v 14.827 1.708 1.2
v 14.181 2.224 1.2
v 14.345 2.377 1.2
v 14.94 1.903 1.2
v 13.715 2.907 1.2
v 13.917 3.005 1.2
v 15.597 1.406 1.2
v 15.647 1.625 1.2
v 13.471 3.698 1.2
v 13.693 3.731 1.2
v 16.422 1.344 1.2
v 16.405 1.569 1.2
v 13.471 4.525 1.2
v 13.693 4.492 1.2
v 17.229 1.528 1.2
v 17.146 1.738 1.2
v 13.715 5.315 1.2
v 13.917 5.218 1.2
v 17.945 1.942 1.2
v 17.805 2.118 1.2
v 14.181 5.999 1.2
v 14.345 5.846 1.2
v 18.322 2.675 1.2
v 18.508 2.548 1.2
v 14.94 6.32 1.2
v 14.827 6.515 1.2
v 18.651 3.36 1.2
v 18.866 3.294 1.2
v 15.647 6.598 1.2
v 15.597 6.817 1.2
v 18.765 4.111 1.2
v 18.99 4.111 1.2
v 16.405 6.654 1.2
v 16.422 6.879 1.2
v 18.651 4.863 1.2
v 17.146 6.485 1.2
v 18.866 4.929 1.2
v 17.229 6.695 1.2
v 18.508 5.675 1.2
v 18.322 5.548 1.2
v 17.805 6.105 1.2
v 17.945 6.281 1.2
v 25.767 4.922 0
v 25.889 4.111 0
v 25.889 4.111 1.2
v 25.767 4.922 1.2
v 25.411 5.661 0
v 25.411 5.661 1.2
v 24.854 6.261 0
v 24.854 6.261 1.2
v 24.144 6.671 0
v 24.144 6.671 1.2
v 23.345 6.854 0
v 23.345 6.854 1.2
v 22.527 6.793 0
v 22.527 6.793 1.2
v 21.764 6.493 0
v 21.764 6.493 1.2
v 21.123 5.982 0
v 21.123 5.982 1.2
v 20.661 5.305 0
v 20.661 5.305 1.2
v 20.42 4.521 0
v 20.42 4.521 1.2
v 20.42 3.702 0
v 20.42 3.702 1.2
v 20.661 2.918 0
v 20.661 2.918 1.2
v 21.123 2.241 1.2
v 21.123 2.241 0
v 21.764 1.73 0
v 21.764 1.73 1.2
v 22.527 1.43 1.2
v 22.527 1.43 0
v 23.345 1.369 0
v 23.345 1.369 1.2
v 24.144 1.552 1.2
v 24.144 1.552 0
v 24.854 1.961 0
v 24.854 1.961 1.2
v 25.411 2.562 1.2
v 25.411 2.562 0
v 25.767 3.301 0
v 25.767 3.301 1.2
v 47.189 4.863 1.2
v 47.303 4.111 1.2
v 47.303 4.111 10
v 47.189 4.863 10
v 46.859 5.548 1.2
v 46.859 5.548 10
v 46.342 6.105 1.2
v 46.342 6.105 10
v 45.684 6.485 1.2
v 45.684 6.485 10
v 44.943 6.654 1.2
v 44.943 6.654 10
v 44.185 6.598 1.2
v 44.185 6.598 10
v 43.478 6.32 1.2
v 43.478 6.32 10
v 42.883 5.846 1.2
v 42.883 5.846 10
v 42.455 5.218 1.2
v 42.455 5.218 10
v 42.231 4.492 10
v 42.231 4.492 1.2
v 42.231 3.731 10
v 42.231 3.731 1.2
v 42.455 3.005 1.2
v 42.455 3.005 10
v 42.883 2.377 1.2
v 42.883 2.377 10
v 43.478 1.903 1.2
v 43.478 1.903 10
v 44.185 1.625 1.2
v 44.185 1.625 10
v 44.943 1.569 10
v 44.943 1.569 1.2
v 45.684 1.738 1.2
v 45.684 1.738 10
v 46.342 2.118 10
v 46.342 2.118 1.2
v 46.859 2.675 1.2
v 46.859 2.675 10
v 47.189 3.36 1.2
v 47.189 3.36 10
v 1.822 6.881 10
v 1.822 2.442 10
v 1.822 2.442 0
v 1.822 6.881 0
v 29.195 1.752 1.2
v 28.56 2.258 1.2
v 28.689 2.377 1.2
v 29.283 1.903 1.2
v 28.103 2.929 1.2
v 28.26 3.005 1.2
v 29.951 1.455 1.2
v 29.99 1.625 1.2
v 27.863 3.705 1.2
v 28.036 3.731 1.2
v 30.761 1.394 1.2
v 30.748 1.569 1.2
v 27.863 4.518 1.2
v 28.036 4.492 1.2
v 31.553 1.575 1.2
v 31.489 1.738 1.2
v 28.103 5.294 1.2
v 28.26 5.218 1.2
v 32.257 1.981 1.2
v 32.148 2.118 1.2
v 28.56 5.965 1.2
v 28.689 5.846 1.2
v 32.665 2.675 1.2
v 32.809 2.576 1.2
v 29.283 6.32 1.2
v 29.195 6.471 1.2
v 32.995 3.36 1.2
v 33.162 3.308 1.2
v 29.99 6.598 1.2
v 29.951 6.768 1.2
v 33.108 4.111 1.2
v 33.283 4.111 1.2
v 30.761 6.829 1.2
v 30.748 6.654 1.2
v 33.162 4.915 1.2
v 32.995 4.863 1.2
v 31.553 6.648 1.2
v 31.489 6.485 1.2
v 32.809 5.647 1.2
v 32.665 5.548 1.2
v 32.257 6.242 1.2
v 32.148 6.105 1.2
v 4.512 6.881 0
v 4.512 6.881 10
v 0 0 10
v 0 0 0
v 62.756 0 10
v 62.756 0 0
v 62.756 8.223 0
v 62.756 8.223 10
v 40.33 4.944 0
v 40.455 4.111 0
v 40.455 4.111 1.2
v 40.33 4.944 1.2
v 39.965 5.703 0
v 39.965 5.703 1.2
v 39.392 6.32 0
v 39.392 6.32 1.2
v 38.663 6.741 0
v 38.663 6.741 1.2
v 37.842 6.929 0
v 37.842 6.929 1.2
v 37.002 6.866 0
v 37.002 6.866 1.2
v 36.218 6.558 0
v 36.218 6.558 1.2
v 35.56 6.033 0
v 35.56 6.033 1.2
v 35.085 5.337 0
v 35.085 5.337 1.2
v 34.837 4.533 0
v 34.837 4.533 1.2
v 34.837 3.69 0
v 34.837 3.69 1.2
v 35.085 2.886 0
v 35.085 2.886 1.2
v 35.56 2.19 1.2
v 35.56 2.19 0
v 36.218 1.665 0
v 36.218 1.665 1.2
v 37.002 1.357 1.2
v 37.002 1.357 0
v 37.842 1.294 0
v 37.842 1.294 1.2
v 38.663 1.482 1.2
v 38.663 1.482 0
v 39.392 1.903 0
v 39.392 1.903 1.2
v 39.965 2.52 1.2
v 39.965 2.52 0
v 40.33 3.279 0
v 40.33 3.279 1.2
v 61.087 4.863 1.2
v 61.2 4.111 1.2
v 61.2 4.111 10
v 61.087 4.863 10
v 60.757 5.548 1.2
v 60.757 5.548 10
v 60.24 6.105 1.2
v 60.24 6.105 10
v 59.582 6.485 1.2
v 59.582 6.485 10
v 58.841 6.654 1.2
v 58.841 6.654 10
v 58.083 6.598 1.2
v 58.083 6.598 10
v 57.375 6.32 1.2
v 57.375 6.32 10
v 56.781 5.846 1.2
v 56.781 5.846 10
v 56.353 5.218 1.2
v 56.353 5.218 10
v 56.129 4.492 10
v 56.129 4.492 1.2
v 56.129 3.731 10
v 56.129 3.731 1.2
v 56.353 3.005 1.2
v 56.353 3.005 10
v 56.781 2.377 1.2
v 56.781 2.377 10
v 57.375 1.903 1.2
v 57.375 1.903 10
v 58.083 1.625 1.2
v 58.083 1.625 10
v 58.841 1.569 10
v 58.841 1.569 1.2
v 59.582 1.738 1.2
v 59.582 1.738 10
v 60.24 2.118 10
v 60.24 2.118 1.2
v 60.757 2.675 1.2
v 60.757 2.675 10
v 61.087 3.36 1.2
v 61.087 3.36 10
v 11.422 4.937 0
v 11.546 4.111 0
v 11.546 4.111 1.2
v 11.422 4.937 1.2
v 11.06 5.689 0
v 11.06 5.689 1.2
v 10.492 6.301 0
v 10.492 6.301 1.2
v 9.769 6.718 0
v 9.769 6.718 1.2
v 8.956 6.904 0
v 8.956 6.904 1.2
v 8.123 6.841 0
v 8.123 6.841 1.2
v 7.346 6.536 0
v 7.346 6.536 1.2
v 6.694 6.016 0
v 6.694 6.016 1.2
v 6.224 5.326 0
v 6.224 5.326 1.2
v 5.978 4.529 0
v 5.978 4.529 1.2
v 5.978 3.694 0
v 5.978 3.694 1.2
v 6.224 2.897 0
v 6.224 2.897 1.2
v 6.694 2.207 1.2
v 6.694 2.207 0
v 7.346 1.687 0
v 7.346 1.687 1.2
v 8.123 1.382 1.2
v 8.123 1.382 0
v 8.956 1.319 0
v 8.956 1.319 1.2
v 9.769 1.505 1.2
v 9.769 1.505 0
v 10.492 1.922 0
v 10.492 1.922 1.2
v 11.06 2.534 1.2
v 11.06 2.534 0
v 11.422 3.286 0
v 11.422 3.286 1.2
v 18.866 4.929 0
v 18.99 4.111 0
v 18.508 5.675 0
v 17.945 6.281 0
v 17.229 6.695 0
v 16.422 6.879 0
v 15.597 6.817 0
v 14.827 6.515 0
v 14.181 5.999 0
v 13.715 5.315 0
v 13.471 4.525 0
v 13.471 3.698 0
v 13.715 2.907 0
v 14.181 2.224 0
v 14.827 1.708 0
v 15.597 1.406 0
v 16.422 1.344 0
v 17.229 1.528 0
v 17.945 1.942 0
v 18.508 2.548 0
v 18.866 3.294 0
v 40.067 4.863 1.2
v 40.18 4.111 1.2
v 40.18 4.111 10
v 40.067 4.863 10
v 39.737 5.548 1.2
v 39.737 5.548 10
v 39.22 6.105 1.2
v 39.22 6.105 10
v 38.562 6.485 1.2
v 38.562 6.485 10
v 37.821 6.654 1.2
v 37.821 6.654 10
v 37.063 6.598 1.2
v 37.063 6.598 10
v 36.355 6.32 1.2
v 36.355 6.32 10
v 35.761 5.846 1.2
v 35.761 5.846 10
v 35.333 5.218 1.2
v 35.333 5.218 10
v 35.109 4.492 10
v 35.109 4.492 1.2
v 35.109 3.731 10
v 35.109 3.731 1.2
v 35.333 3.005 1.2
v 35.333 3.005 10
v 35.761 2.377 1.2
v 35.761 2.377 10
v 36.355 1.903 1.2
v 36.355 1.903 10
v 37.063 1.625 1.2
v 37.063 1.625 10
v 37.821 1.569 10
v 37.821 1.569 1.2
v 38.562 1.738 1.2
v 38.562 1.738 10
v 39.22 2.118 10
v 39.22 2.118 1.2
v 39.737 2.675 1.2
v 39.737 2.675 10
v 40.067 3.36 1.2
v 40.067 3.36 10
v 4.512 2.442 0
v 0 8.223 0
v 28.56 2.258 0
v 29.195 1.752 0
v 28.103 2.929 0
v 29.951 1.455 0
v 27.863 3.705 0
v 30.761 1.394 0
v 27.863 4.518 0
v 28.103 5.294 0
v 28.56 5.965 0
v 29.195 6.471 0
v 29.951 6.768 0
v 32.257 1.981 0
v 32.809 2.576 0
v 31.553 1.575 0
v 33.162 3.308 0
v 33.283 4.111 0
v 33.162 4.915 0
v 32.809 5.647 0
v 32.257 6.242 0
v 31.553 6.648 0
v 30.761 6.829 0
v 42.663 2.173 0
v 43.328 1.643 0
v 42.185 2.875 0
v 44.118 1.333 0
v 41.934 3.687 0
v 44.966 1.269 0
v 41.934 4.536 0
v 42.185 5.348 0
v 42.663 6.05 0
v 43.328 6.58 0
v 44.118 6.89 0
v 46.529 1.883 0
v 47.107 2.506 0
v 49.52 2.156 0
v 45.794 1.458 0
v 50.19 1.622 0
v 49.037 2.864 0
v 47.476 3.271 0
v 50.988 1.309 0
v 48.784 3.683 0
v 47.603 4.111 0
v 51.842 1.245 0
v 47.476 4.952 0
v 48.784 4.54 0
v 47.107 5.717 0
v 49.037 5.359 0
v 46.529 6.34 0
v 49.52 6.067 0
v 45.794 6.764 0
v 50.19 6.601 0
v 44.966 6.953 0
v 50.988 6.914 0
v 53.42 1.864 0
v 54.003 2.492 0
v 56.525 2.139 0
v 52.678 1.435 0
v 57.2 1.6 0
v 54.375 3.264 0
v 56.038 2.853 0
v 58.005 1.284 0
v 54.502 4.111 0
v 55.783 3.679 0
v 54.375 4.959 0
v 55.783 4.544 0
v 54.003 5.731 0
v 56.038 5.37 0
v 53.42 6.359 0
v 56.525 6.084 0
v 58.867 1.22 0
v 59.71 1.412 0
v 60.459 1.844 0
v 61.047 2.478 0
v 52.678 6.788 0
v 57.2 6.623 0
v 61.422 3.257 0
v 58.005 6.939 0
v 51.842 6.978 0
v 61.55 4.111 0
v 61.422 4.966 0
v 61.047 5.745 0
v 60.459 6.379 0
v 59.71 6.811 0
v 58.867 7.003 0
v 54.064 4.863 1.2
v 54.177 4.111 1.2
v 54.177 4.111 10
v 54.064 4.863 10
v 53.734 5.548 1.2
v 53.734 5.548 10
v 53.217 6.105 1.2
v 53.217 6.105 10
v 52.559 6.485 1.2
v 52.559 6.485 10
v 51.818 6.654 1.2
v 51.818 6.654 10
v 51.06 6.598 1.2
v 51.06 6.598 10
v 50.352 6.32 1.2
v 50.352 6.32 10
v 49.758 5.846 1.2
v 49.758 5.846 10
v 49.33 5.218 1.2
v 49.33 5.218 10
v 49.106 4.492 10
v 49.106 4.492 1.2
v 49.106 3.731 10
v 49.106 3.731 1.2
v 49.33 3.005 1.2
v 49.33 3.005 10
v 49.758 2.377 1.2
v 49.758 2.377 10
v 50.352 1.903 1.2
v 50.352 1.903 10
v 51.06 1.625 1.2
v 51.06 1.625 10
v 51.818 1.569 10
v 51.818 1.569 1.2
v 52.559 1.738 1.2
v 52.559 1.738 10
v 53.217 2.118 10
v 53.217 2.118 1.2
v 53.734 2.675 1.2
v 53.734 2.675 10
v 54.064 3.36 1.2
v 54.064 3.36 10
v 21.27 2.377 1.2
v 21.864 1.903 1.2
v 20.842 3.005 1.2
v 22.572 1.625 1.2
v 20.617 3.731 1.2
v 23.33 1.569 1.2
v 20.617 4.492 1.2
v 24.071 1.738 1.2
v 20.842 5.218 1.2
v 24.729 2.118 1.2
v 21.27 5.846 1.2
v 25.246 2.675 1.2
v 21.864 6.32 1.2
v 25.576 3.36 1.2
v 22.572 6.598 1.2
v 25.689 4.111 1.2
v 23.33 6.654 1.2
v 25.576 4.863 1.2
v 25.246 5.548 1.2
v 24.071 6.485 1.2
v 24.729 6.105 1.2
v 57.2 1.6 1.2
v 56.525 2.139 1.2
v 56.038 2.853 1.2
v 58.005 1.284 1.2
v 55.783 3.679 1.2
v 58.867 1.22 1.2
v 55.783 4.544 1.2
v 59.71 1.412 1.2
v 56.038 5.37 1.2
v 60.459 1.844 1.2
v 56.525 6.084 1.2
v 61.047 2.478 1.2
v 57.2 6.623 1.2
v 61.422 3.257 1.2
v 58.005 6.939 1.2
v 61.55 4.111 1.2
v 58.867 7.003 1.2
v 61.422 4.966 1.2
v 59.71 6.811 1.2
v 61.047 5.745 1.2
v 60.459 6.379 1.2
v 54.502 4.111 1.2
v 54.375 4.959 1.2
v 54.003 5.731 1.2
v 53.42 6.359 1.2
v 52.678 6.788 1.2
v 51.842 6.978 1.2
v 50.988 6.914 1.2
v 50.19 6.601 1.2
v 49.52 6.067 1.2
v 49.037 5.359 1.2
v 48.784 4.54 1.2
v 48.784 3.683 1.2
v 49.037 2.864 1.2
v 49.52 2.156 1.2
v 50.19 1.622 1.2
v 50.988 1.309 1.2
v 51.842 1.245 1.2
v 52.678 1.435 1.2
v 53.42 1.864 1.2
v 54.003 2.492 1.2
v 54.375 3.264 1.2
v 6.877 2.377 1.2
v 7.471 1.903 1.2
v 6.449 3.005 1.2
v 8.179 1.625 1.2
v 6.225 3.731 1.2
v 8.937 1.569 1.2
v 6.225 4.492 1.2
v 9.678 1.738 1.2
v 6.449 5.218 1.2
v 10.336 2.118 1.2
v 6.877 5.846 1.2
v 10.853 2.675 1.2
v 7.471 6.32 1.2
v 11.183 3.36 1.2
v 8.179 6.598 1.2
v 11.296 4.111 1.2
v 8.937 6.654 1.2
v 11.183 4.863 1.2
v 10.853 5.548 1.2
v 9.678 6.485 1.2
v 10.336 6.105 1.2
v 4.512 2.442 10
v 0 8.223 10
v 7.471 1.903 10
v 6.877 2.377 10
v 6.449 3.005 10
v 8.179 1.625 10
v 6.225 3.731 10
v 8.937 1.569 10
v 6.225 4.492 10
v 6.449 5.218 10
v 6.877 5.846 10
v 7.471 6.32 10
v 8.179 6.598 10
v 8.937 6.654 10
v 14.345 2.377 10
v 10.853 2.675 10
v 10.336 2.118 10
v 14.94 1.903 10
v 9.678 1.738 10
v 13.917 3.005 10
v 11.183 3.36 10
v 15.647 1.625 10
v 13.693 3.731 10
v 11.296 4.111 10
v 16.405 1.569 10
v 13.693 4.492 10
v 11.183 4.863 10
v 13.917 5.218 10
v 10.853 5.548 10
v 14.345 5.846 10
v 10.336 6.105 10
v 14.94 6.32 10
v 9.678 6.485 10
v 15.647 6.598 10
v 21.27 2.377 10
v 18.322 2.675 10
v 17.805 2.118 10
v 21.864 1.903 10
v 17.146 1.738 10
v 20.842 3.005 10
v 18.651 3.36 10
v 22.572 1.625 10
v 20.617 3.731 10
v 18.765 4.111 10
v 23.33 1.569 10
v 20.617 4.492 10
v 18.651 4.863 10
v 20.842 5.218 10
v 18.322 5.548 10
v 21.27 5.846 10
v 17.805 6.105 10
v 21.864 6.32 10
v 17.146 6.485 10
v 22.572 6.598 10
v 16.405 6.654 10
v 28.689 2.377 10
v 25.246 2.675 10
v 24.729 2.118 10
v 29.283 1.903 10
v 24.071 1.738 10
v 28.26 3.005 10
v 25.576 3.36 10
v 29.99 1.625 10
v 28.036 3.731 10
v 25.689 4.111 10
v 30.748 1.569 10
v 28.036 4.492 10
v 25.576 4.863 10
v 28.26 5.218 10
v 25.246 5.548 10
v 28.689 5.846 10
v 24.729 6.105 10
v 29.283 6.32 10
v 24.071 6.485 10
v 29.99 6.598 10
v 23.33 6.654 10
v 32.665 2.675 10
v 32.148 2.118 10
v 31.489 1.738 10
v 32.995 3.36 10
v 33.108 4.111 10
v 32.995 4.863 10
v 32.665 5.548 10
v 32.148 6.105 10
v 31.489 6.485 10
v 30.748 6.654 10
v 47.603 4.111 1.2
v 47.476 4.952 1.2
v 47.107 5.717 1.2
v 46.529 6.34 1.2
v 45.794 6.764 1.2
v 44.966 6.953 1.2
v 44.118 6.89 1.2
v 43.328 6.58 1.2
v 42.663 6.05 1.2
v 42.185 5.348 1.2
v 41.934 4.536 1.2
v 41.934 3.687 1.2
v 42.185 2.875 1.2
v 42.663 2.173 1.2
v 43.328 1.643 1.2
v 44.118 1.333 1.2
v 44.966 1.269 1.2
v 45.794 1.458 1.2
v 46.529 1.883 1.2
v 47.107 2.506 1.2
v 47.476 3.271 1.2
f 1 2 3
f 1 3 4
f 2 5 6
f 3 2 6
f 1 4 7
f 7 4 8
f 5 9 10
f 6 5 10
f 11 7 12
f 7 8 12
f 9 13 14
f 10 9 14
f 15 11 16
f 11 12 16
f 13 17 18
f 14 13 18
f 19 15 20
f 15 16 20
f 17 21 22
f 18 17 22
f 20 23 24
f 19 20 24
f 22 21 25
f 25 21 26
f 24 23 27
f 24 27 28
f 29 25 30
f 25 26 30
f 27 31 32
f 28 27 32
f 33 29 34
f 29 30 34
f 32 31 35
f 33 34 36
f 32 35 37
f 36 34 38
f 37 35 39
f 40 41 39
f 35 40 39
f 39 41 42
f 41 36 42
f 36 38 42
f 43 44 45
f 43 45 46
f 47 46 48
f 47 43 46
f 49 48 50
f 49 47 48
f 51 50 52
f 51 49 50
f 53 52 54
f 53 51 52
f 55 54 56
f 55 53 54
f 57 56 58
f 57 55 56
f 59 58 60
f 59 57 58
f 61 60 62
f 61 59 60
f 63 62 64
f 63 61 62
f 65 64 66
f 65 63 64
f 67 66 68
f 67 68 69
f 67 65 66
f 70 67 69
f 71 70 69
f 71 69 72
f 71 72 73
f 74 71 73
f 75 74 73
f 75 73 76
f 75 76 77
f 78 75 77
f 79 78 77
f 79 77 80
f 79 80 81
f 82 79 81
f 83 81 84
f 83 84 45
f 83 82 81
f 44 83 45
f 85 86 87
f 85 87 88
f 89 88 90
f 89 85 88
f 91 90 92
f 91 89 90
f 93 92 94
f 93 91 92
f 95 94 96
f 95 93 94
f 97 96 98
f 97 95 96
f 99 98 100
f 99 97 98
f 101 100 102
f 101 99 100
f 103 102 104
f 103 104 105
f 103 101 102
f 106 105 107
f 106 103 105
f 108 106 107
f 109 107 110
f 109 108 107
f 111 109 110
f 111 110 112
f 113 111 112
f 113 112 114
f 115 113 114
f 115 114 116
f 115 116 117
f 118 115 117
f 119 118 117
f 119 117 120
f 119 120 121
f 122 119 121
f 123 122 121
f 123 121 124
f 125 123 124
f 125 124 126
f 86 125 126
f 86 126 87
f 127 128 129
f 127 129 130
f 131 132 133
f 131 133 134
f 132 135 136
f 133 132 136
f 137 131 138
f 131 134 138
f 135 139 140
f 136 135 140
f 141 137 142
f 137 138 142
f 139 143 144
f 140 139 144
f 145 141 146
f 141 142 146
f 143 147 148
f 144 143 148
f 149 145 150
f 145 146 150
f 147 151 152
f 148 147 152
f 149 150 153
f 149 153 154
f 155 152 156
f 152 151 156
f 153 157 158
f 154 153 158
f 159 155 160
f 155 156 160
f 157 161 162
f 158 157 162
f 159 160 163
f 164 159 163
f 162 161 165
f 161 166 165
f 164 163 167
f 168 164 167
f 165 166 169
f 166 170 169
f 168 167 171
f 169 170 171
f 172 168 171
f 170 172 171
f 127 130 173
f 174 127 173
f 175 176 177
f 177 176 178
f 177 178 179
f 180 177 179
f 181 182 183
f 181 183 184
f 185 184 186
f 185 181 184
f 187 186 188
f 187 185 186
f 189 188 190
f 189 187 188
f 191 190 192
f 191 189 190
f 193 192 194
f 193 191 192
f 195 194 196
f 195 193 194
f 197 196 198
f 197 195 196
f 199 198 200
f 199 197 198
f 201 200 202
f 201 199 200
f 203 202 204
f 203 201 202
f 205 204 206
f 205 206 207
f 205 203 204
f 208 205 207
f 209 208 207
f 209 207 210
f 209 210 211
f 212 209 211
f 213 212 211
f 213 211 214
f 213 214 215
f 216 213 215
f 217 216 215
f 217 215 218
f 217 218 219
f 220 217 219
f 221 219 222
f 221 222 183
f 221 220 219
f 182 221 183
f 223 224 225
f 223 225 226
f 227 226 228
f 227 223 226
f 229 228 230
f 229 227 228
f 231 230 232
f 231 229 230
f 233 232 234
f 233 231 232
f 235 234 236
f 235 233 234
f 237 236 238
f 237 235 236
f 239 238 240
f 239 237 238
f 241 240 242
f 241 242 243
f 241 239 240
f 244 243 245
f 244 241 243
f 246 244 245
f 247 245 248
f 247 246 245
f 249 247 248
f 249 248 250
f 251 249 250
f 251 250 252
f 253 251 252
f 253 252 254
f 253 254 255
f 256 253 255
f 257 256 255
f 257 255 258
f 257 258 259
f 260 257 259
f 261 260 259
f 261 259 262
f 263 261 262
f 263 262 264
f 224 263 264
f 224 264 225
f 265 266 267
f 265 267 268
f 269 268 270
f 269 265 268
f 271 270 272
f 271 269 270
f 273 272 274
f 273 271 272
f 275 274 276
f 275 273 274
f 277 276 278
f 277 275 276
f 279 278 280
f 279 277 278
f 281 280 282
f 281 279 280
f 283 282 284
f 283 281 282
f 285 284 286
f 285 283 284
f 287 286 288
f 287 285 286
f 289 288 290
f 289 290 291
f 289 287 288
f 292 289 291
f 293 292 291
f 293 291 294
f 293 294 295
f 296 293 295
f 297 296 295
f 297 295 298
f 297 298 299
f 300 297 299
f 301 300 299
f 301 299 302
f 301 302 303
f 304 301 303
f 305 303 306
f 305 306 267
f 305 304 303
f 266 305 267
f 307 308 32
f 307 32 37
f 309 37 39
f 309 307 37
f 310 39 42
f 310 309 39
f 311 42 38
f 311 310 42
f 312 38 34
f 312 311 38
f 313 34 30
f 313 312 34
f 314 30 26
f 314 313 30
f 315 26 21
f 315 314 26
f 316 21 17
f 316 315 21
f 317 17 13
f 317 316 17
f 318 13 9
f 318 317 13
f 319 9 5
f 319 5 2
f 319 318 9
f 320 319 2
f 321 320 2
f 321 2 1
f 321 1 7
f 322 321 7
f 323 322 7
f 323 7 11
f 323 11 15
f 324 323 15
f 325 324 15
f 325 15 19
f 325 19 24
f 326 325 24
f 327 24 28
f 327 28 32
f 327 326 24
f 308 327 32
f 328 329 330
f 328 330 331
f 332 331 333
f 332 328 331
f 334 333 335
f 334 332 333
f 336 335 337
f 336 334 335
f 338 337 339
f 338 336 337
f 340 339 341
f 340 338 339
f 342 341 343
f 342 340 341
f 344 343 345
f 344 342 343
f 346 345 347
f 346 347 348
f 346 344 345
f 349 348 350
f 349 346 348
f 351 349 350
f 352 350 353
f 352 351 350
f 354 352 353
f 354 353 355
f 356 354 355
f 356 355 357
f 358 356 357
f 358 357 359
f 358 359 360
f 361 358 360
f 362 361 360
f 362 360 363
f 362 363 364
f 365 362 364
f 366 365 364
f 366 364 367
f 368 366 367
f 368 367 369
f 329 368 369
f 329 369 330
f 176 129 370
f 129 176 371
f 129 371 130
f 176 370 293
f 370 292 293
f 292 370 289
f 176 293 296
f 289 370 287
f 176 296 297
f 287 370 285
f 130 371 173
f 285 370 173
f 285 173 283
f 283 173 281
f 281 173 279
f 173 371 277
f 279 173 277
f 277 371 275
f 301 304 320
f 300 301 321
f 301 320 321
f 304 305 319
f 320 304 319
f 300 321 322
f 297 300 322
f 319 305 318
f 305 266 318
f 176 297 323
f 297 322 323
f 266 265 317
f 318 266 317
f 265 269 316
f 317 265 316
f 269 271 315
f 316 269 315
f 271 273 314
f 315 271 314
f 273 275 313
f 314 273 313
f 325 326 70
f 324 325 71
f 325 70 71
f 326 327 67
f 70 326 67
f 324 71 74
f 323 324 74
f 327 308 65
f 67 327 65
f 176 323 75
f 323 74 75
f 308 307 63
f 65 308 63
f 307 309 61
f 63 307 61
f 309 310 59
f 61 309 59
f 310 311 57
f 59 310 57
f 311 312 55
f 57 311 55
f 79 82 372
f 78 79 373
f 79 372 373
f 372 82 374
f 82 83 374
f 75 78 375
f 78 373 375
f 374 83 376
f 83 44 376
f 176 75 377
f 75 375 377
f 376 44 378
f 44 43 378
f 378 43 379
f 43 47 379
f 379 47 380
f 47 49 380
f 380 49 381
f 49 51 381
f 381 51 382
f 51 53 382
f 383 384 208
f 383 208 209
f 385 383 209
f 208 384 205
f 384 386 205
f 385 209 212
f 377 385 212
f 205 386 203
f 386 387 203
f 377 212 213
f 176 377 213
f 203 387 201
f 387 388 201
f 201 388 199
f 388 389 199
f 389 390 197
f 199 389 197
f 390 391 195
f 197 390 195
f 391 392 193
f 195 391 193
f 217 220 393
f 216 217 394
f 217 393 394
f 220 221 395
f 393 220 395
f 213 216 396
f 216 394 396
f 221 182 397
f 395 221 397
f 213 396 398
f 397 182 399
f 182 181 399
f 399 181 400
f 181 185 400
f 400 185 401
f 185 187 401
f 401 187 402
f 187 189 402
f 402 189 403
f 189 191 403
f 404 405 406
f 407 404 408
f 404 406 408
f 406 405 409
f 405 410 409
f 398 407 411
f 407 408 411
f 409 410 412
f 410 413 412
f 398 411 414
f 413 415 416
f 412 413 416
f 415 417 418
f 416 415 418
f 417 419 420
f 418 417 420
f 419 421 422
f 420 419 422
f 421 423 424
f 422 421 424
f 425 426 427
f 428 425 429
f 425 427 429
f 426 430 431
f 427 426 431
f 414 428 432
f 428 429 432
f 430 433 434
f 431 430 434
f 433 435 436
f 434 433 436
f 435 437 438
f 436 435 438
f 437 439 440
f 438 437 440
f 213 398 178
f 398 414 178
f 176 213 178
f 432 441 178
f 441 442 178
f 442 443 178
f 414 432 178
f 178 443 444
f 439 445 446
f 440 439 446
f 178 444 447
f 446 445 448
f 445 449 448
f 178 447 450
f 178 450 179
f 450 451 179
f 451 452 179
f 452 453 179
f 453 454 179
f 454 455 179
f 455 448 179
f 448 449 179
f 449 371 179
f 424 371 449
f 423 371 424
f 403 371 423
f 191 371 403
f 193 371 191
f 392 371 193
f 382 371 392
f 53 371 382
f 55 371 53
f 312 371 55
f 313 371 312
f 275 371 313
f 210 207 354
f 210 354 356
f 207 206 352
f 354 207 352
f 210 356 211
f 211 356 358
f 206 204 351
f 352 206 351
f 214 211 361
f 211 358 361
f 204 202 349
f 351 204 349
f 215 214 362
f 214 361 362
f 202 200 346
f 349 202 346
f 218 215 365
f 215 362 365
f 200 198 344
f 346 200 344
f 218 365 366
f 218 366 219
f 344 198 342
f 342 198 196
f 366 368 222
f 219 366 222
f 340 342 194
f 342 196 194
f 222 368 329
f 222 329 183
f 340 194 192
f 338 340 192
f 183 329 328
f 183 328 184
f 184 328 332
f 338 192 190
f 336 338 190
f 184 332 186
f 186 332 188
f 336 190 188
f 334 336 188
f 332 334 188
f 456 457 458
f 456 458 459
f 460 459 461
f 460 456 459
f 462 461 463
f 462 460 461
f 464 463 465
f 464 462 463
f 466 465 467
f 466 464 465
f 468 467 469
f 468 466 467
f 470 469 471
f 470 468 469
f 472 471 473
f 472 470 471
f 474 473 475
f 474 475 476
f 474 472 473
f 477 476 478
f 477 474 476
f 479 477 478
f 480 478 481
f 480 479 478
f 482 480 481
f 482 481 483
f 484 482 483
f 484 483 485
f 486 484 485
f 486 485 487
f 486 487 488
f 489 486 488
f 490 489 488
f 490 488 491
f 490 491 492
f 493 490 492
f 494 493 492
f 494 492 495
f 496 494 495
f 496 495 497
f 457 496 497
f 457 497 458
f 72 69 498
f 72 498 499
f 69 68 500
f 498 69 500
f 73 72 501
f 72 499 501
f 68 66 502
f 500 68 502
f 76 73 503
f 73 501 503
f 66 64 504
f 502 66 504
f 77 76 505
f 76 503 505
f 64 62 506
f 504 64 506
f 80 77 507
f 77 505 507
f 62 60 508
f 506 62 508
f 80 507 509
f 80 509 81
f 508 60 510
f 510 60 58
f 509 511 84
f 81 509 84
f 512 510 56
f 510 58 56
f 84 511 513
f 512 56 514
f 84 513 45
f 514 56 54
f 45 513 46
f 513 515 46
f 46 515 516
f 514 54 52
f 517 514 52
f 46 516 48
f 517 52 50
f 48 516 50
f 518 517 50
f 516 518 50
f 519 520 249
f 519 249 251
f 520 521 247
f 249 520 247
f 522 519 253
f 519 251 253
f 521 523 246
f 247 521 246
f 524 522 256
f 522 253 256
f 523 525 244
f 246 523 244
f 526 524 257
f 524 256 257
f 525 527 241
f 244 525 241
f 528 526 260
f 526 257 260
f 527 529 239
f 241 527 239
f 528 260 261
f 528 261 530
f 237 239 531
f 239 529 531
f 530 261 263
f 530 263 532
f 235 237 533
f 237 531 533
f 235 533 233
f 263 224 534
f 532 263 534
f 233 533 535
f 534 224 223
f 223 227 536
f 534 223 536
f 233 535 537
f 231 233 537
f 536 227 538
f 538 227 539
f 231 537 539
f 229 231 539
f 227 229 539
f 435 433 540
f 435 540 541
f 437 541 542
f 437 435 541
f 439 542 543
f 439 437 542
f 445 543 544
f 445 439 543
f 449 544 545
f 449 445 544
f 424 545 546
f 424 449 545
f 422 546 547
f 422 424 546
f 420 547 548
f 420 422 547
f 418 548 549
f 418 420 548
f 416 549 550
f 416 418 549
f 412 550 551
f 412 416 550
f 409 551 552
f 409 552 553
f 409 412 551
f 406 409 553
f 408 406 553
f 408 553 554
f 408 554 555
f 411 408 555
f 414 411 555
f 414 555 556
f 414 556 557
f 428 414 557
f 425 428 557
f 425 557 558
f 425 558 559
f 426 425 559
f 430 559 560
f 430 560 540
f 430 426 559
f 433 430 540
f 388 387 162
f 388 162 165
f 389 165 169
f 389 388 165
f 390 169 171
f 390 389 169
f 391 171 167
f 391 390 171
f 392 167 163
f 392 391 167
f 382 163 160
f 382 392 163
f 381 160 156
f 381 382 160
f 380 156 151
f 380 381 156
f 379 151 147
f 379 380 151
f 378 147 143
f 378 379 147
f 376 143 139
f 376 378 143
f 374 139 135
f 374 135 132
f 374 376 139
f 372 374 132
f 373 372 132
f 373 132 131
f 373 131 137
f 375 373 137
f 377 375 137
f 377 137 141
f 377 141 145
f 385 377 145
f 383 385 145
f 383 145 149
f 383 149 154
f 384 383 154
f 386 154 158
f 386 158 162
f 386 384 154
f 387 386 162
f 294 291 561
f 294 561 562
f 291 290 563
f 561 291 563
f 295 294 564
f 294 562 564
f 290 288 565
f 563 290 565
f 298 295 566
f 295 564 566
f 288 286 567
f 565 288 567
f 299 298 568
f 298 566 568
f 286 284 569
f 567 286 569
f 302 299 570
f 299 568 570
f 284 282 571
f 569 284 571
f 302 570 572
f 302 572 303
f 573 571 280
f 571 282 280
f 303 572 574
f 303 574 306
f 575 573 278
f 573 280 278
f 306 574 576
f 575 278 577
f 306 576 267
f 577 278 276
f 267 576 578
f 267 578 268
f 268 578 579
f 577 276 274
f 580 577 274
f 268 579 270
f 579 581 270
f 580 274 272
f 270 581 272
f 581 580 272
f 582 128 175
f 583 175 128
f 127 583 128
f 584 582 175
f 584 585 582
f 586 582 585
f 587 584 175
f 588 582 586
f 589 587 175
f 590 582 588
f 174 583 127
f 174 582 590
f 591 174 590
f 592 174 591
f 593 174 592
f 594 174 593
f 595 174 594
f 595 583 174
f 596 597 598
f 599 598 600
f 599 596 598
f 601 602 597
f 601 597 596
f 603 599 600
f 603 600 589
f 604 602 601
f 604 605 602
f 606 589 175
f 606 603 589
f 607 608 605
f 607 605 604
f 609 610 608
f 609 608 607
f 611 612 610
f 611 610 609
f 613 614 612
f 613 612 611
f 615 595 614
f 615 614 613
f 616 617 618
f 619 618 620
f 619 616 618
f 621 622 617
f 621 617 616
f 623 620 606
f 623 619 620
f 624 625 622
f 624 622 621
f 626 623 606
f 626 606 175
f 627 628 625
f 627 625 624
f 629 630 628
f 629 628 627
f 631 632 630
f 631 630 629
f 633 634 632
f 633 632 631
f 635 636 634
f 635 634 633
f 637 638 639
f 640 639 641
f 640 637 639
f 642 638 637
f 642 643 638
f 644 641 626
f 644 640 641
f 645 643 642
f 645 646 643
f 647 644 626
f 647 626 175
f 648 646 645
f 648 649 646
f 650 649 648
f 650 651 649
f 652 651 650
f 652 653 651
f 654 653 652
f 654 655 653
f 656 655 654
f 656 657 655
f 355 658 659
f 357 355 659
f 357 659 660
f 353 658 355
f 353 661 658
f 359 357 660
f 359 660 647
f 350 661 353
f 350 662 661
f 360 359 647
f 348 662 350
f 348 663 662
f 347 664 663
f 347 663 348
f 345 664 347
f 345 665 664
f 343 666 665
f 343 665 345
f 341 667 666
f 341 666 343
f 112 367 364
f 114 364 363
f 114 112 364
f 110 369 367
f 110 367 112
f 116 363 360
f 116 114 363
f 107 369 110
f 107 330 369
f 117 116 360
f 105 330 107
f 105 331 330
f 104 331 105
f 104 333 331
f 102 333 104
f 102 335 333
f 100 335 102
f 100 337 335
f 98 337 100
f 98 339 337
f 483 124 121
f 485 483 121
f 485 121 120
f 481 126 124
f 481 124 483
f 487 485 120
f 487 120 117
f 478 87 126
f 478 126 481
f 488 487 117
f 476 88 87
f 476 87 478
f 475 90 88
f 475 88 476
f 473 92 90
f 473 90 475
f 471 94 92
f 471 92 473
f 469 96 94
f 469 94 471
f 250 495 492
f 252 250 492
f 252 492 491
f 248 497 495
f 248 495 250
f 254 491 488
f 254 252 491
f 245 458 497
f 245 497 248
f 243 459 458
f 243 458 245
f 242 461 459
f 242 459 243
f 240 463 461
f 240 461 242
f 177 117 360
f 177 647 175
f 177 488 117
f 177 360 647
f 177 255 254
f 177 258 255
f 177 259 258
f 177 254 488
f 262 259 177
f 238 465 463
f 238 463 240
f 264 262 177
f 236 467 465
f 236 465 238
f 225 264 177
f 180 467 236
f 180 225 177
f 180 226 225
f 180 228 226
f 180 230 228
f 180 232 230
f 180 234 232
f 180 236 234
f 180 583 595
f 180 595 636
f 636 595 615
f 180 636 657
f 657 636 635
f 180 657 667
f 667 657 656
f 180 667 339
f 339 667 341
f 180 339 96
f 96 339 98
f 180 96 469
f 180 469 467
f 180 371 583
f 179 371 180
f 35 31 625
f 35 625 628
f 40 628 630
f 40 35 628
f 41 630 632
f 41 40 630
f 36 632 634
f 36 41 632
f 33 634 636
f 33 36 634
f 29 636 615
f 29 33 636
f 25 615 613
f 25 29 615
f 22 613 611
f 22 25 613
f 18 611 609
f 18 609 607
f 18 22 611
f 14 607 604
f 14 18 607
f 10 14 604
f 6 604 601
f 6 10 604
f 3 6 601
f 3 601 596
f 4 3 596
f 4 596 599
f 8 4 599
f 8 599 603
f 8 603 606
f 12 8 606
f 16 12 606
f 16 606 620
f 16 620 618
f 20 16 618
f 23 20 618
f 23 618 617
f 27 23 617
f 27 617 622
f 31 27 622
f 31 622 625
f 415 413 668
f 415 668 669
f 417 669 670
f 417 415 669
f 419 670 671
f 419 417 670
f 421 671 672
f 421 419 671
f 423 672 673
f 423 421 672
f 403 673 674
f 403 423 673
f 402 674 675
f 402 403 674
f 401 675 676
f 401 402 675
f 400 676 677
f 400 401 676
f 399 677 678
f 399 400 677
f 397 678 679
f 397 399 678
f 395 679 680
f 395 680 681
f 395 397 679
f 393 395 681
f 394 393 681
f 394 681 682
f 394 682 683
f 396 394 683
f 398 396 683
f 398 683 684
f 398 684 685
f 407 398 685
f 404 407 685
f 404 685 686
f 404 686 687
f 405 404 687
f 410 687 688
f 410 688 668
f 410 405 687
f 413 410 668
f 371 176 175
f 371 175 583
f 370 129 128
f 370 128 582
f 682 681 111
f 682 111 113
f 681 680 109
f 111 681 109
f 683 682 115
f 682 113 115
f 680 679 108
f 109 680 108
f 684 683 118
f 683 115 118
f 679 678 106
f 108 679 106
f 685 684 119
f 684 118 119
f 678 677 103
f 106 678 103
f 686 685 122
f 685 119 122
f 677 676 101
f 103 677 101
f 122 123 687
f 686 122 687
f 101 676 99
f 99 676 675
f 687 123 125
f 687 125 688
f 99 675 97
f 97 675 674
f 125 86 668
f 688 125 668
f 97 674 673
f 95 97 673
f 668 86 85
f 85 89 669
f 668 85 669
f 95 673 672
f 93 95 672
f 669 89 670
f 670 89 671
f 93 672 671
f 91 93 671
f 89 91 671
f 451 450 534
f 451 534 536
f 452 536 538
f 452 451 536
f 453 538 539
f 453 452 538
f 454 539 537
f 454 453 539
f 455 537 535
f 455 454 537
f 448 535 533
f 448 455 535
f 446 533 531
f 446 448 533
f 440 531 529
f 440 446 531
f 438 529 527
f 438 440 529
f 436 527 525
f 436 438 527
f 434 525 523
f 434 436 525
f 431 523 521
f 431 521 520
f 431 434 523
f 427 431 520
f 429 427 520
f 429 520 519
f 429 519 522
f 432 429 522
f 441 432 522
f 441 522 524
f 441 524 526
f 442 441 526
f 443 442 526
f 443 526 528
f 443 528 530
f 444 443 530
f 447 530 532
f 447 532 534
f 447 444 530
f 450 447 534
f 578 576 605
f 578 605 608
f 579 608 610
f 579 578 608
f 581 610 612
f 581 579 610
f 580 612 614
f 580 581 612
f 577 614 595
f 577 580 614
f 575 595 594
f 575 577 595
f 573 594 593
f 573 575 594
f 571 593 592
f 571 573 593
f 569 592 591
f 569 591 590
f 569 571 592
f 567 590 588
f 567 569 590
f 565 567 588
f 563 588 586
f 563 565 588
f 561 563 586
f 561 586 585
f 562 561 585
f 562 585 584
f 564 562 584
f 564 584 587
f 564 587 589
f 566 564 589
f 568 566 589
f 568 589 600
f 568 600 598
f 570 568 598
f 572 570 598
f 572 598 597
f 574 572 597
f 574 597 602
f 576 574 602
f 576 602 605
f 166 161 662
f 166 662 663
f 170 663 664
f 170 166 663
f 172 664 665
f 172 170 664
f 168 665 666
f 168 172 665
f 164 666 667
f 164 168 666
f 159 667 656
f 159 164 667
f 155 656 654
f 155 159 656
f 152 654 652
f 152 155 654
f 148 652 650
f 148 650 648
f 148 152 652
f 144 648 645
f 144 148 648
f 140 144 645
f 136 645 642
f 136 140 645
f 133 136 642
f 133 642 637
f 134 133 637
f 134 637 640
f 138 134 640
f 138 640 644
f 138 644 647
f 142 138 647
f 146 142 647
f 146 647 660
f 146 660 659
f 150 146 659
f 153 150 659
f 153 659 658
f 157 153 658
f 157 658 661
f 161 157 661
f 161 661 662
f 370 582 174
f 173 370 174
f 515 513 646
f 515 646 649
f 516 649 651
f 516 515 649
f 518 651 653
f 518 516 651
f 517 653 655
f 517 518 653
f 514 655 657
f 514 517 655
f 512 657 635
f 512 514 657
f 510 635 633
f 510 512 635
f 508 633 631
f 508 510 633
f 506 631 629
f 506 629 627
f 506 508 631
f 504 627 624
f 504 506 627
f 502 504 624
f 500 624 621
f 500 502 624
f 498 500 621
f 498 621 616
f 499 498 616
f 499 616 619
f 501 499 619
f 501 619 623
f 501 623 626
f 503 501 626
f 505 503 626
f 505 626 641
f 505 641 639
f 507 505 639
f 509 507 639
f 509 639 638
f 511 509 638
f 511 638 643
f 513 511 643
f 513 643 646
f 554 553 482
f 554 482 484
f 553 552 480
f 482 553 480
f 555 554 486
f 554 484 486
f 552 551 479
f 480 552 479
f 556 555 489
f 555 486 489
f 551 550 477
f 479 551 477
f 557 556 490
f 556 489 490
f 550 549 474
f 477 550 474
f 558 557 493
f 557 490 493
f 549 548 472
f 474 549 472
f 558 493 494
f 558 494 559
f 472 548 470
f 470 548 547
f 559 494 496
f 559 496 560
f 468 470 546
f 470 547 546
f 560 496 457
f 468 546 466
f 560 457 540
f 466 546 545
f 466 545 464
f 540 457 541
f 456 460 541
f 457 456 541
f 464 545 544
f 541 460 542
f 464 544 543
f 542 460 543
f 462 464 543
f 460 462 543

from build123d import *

# Parameters (mm, degrees)
SKETCH1_W           = 62.755543402
SKETCH1_H           = 8.222921835
BOSS_EXTRUDE1_DEPTH = 10
SKETCH1_3_R         = 2.55
SKETCH1_3_W         = 2.689412068
SKETCH1_3_H         = 4.439494762
CUT_EXTRUDE1_DEPTH  = 10
SKETCH1_4_R         = 2.8
SKETCH1_4_R_2       = 2.775
SKETCH1_4_R_3       = 2.75
SKETCH1_4_R_4       = 2.725
SKETCH1_4_R_5       = 2.825
SKETCH1_4_R_6       = 2.85
SKETCH1_4_R_7       = 2.875
SKETCH1_4_R_8       = 2.9
CUT_EXTRUDE2_DEPTH  = 1.2


with BuildPart() as part:
    # Sketch1 → Boss-Extrude1 (new body)
    with BuildSketch(Plane.XY):
        with Locations((31.377771701, 4.111460918)):
            Rectangle(SKETCH1_W, SKETCH1_H)
    extrude(amount=BOSS_EXTRUDE1_DEPTH)

    # Sketch1<3> → Cut-Extrude1 (cut)
    with BuildSketch(Plane.XY):
        with Locations((8.746479161, 4.111460918)):
            Circle(SKETCH1_3_R)
        with Locations((16.214765516, 4.111460918)):
            Circle(SKETCH1_3_R)
        with Locations((23.139004522, 4.111460918)):
            Circle(SKETCH1_3_R)
        with Locations((30.557832028, 4.111460918)):
            Circle(SKETCH1_3_R)
        with Locations((37.630447583, 4.111460918)):
            Circle(SKETCH1_3_R)
        with Locations((44.752521989, 4.111460918)):
            Circle(SKETCH1_3_R)
        with Locations((51.627302144, 4.111460918)):
            Circle(SKETCH1_3_R)
        with Locations((58.650458849, 4.111460918)):
            Circle(SKETCH1_3_R)
        with Locations((3.166946189, 4.661409139)):
            Rectangle(SKETCH1_3_W, SKETCH1_3_H)
    extrude(amount=CUT_EXTRUDE1_DEPTH, mode=Mode.SUBTRACT)

    # Sketch1<4> → Cut-Extrude2 (cut)
    with BuildSketch(Plane.XY):
        with Locations((8.746479161, 4.111460918)):
            Circle(SKETCH1_4_R)
        with Locations((16.214765516, 4.111460918)):
            Circle(SKETCH1_4_R_2)
        with Locations((23.139004522, 4.111460918)):
            Circle(SKETCH1_4_R_3)
        with Locations((30.557832028, 4.111460918)):
            Circle(SKETCH1_4_R_4)
        with Locations((37.630447583, 4.111460918)):
            Circle(SKETCH1_4_R_5)
        with Locations((44.752521989, 4.111460918)):
            Circle(SKETCH1_4_R_6)
        with Locations((51.627302144, 4.111460918)):
            Circle(SKETCH1_4_R_7)
        with Locations((58.650458849, 4.111460918)):
            Circle(SKETCH1_4_R_8)
    extrude(amount=CUT_EXTRUDE2_DEPTH, mode=Mode.SUBTRACT)


solid = part.part
